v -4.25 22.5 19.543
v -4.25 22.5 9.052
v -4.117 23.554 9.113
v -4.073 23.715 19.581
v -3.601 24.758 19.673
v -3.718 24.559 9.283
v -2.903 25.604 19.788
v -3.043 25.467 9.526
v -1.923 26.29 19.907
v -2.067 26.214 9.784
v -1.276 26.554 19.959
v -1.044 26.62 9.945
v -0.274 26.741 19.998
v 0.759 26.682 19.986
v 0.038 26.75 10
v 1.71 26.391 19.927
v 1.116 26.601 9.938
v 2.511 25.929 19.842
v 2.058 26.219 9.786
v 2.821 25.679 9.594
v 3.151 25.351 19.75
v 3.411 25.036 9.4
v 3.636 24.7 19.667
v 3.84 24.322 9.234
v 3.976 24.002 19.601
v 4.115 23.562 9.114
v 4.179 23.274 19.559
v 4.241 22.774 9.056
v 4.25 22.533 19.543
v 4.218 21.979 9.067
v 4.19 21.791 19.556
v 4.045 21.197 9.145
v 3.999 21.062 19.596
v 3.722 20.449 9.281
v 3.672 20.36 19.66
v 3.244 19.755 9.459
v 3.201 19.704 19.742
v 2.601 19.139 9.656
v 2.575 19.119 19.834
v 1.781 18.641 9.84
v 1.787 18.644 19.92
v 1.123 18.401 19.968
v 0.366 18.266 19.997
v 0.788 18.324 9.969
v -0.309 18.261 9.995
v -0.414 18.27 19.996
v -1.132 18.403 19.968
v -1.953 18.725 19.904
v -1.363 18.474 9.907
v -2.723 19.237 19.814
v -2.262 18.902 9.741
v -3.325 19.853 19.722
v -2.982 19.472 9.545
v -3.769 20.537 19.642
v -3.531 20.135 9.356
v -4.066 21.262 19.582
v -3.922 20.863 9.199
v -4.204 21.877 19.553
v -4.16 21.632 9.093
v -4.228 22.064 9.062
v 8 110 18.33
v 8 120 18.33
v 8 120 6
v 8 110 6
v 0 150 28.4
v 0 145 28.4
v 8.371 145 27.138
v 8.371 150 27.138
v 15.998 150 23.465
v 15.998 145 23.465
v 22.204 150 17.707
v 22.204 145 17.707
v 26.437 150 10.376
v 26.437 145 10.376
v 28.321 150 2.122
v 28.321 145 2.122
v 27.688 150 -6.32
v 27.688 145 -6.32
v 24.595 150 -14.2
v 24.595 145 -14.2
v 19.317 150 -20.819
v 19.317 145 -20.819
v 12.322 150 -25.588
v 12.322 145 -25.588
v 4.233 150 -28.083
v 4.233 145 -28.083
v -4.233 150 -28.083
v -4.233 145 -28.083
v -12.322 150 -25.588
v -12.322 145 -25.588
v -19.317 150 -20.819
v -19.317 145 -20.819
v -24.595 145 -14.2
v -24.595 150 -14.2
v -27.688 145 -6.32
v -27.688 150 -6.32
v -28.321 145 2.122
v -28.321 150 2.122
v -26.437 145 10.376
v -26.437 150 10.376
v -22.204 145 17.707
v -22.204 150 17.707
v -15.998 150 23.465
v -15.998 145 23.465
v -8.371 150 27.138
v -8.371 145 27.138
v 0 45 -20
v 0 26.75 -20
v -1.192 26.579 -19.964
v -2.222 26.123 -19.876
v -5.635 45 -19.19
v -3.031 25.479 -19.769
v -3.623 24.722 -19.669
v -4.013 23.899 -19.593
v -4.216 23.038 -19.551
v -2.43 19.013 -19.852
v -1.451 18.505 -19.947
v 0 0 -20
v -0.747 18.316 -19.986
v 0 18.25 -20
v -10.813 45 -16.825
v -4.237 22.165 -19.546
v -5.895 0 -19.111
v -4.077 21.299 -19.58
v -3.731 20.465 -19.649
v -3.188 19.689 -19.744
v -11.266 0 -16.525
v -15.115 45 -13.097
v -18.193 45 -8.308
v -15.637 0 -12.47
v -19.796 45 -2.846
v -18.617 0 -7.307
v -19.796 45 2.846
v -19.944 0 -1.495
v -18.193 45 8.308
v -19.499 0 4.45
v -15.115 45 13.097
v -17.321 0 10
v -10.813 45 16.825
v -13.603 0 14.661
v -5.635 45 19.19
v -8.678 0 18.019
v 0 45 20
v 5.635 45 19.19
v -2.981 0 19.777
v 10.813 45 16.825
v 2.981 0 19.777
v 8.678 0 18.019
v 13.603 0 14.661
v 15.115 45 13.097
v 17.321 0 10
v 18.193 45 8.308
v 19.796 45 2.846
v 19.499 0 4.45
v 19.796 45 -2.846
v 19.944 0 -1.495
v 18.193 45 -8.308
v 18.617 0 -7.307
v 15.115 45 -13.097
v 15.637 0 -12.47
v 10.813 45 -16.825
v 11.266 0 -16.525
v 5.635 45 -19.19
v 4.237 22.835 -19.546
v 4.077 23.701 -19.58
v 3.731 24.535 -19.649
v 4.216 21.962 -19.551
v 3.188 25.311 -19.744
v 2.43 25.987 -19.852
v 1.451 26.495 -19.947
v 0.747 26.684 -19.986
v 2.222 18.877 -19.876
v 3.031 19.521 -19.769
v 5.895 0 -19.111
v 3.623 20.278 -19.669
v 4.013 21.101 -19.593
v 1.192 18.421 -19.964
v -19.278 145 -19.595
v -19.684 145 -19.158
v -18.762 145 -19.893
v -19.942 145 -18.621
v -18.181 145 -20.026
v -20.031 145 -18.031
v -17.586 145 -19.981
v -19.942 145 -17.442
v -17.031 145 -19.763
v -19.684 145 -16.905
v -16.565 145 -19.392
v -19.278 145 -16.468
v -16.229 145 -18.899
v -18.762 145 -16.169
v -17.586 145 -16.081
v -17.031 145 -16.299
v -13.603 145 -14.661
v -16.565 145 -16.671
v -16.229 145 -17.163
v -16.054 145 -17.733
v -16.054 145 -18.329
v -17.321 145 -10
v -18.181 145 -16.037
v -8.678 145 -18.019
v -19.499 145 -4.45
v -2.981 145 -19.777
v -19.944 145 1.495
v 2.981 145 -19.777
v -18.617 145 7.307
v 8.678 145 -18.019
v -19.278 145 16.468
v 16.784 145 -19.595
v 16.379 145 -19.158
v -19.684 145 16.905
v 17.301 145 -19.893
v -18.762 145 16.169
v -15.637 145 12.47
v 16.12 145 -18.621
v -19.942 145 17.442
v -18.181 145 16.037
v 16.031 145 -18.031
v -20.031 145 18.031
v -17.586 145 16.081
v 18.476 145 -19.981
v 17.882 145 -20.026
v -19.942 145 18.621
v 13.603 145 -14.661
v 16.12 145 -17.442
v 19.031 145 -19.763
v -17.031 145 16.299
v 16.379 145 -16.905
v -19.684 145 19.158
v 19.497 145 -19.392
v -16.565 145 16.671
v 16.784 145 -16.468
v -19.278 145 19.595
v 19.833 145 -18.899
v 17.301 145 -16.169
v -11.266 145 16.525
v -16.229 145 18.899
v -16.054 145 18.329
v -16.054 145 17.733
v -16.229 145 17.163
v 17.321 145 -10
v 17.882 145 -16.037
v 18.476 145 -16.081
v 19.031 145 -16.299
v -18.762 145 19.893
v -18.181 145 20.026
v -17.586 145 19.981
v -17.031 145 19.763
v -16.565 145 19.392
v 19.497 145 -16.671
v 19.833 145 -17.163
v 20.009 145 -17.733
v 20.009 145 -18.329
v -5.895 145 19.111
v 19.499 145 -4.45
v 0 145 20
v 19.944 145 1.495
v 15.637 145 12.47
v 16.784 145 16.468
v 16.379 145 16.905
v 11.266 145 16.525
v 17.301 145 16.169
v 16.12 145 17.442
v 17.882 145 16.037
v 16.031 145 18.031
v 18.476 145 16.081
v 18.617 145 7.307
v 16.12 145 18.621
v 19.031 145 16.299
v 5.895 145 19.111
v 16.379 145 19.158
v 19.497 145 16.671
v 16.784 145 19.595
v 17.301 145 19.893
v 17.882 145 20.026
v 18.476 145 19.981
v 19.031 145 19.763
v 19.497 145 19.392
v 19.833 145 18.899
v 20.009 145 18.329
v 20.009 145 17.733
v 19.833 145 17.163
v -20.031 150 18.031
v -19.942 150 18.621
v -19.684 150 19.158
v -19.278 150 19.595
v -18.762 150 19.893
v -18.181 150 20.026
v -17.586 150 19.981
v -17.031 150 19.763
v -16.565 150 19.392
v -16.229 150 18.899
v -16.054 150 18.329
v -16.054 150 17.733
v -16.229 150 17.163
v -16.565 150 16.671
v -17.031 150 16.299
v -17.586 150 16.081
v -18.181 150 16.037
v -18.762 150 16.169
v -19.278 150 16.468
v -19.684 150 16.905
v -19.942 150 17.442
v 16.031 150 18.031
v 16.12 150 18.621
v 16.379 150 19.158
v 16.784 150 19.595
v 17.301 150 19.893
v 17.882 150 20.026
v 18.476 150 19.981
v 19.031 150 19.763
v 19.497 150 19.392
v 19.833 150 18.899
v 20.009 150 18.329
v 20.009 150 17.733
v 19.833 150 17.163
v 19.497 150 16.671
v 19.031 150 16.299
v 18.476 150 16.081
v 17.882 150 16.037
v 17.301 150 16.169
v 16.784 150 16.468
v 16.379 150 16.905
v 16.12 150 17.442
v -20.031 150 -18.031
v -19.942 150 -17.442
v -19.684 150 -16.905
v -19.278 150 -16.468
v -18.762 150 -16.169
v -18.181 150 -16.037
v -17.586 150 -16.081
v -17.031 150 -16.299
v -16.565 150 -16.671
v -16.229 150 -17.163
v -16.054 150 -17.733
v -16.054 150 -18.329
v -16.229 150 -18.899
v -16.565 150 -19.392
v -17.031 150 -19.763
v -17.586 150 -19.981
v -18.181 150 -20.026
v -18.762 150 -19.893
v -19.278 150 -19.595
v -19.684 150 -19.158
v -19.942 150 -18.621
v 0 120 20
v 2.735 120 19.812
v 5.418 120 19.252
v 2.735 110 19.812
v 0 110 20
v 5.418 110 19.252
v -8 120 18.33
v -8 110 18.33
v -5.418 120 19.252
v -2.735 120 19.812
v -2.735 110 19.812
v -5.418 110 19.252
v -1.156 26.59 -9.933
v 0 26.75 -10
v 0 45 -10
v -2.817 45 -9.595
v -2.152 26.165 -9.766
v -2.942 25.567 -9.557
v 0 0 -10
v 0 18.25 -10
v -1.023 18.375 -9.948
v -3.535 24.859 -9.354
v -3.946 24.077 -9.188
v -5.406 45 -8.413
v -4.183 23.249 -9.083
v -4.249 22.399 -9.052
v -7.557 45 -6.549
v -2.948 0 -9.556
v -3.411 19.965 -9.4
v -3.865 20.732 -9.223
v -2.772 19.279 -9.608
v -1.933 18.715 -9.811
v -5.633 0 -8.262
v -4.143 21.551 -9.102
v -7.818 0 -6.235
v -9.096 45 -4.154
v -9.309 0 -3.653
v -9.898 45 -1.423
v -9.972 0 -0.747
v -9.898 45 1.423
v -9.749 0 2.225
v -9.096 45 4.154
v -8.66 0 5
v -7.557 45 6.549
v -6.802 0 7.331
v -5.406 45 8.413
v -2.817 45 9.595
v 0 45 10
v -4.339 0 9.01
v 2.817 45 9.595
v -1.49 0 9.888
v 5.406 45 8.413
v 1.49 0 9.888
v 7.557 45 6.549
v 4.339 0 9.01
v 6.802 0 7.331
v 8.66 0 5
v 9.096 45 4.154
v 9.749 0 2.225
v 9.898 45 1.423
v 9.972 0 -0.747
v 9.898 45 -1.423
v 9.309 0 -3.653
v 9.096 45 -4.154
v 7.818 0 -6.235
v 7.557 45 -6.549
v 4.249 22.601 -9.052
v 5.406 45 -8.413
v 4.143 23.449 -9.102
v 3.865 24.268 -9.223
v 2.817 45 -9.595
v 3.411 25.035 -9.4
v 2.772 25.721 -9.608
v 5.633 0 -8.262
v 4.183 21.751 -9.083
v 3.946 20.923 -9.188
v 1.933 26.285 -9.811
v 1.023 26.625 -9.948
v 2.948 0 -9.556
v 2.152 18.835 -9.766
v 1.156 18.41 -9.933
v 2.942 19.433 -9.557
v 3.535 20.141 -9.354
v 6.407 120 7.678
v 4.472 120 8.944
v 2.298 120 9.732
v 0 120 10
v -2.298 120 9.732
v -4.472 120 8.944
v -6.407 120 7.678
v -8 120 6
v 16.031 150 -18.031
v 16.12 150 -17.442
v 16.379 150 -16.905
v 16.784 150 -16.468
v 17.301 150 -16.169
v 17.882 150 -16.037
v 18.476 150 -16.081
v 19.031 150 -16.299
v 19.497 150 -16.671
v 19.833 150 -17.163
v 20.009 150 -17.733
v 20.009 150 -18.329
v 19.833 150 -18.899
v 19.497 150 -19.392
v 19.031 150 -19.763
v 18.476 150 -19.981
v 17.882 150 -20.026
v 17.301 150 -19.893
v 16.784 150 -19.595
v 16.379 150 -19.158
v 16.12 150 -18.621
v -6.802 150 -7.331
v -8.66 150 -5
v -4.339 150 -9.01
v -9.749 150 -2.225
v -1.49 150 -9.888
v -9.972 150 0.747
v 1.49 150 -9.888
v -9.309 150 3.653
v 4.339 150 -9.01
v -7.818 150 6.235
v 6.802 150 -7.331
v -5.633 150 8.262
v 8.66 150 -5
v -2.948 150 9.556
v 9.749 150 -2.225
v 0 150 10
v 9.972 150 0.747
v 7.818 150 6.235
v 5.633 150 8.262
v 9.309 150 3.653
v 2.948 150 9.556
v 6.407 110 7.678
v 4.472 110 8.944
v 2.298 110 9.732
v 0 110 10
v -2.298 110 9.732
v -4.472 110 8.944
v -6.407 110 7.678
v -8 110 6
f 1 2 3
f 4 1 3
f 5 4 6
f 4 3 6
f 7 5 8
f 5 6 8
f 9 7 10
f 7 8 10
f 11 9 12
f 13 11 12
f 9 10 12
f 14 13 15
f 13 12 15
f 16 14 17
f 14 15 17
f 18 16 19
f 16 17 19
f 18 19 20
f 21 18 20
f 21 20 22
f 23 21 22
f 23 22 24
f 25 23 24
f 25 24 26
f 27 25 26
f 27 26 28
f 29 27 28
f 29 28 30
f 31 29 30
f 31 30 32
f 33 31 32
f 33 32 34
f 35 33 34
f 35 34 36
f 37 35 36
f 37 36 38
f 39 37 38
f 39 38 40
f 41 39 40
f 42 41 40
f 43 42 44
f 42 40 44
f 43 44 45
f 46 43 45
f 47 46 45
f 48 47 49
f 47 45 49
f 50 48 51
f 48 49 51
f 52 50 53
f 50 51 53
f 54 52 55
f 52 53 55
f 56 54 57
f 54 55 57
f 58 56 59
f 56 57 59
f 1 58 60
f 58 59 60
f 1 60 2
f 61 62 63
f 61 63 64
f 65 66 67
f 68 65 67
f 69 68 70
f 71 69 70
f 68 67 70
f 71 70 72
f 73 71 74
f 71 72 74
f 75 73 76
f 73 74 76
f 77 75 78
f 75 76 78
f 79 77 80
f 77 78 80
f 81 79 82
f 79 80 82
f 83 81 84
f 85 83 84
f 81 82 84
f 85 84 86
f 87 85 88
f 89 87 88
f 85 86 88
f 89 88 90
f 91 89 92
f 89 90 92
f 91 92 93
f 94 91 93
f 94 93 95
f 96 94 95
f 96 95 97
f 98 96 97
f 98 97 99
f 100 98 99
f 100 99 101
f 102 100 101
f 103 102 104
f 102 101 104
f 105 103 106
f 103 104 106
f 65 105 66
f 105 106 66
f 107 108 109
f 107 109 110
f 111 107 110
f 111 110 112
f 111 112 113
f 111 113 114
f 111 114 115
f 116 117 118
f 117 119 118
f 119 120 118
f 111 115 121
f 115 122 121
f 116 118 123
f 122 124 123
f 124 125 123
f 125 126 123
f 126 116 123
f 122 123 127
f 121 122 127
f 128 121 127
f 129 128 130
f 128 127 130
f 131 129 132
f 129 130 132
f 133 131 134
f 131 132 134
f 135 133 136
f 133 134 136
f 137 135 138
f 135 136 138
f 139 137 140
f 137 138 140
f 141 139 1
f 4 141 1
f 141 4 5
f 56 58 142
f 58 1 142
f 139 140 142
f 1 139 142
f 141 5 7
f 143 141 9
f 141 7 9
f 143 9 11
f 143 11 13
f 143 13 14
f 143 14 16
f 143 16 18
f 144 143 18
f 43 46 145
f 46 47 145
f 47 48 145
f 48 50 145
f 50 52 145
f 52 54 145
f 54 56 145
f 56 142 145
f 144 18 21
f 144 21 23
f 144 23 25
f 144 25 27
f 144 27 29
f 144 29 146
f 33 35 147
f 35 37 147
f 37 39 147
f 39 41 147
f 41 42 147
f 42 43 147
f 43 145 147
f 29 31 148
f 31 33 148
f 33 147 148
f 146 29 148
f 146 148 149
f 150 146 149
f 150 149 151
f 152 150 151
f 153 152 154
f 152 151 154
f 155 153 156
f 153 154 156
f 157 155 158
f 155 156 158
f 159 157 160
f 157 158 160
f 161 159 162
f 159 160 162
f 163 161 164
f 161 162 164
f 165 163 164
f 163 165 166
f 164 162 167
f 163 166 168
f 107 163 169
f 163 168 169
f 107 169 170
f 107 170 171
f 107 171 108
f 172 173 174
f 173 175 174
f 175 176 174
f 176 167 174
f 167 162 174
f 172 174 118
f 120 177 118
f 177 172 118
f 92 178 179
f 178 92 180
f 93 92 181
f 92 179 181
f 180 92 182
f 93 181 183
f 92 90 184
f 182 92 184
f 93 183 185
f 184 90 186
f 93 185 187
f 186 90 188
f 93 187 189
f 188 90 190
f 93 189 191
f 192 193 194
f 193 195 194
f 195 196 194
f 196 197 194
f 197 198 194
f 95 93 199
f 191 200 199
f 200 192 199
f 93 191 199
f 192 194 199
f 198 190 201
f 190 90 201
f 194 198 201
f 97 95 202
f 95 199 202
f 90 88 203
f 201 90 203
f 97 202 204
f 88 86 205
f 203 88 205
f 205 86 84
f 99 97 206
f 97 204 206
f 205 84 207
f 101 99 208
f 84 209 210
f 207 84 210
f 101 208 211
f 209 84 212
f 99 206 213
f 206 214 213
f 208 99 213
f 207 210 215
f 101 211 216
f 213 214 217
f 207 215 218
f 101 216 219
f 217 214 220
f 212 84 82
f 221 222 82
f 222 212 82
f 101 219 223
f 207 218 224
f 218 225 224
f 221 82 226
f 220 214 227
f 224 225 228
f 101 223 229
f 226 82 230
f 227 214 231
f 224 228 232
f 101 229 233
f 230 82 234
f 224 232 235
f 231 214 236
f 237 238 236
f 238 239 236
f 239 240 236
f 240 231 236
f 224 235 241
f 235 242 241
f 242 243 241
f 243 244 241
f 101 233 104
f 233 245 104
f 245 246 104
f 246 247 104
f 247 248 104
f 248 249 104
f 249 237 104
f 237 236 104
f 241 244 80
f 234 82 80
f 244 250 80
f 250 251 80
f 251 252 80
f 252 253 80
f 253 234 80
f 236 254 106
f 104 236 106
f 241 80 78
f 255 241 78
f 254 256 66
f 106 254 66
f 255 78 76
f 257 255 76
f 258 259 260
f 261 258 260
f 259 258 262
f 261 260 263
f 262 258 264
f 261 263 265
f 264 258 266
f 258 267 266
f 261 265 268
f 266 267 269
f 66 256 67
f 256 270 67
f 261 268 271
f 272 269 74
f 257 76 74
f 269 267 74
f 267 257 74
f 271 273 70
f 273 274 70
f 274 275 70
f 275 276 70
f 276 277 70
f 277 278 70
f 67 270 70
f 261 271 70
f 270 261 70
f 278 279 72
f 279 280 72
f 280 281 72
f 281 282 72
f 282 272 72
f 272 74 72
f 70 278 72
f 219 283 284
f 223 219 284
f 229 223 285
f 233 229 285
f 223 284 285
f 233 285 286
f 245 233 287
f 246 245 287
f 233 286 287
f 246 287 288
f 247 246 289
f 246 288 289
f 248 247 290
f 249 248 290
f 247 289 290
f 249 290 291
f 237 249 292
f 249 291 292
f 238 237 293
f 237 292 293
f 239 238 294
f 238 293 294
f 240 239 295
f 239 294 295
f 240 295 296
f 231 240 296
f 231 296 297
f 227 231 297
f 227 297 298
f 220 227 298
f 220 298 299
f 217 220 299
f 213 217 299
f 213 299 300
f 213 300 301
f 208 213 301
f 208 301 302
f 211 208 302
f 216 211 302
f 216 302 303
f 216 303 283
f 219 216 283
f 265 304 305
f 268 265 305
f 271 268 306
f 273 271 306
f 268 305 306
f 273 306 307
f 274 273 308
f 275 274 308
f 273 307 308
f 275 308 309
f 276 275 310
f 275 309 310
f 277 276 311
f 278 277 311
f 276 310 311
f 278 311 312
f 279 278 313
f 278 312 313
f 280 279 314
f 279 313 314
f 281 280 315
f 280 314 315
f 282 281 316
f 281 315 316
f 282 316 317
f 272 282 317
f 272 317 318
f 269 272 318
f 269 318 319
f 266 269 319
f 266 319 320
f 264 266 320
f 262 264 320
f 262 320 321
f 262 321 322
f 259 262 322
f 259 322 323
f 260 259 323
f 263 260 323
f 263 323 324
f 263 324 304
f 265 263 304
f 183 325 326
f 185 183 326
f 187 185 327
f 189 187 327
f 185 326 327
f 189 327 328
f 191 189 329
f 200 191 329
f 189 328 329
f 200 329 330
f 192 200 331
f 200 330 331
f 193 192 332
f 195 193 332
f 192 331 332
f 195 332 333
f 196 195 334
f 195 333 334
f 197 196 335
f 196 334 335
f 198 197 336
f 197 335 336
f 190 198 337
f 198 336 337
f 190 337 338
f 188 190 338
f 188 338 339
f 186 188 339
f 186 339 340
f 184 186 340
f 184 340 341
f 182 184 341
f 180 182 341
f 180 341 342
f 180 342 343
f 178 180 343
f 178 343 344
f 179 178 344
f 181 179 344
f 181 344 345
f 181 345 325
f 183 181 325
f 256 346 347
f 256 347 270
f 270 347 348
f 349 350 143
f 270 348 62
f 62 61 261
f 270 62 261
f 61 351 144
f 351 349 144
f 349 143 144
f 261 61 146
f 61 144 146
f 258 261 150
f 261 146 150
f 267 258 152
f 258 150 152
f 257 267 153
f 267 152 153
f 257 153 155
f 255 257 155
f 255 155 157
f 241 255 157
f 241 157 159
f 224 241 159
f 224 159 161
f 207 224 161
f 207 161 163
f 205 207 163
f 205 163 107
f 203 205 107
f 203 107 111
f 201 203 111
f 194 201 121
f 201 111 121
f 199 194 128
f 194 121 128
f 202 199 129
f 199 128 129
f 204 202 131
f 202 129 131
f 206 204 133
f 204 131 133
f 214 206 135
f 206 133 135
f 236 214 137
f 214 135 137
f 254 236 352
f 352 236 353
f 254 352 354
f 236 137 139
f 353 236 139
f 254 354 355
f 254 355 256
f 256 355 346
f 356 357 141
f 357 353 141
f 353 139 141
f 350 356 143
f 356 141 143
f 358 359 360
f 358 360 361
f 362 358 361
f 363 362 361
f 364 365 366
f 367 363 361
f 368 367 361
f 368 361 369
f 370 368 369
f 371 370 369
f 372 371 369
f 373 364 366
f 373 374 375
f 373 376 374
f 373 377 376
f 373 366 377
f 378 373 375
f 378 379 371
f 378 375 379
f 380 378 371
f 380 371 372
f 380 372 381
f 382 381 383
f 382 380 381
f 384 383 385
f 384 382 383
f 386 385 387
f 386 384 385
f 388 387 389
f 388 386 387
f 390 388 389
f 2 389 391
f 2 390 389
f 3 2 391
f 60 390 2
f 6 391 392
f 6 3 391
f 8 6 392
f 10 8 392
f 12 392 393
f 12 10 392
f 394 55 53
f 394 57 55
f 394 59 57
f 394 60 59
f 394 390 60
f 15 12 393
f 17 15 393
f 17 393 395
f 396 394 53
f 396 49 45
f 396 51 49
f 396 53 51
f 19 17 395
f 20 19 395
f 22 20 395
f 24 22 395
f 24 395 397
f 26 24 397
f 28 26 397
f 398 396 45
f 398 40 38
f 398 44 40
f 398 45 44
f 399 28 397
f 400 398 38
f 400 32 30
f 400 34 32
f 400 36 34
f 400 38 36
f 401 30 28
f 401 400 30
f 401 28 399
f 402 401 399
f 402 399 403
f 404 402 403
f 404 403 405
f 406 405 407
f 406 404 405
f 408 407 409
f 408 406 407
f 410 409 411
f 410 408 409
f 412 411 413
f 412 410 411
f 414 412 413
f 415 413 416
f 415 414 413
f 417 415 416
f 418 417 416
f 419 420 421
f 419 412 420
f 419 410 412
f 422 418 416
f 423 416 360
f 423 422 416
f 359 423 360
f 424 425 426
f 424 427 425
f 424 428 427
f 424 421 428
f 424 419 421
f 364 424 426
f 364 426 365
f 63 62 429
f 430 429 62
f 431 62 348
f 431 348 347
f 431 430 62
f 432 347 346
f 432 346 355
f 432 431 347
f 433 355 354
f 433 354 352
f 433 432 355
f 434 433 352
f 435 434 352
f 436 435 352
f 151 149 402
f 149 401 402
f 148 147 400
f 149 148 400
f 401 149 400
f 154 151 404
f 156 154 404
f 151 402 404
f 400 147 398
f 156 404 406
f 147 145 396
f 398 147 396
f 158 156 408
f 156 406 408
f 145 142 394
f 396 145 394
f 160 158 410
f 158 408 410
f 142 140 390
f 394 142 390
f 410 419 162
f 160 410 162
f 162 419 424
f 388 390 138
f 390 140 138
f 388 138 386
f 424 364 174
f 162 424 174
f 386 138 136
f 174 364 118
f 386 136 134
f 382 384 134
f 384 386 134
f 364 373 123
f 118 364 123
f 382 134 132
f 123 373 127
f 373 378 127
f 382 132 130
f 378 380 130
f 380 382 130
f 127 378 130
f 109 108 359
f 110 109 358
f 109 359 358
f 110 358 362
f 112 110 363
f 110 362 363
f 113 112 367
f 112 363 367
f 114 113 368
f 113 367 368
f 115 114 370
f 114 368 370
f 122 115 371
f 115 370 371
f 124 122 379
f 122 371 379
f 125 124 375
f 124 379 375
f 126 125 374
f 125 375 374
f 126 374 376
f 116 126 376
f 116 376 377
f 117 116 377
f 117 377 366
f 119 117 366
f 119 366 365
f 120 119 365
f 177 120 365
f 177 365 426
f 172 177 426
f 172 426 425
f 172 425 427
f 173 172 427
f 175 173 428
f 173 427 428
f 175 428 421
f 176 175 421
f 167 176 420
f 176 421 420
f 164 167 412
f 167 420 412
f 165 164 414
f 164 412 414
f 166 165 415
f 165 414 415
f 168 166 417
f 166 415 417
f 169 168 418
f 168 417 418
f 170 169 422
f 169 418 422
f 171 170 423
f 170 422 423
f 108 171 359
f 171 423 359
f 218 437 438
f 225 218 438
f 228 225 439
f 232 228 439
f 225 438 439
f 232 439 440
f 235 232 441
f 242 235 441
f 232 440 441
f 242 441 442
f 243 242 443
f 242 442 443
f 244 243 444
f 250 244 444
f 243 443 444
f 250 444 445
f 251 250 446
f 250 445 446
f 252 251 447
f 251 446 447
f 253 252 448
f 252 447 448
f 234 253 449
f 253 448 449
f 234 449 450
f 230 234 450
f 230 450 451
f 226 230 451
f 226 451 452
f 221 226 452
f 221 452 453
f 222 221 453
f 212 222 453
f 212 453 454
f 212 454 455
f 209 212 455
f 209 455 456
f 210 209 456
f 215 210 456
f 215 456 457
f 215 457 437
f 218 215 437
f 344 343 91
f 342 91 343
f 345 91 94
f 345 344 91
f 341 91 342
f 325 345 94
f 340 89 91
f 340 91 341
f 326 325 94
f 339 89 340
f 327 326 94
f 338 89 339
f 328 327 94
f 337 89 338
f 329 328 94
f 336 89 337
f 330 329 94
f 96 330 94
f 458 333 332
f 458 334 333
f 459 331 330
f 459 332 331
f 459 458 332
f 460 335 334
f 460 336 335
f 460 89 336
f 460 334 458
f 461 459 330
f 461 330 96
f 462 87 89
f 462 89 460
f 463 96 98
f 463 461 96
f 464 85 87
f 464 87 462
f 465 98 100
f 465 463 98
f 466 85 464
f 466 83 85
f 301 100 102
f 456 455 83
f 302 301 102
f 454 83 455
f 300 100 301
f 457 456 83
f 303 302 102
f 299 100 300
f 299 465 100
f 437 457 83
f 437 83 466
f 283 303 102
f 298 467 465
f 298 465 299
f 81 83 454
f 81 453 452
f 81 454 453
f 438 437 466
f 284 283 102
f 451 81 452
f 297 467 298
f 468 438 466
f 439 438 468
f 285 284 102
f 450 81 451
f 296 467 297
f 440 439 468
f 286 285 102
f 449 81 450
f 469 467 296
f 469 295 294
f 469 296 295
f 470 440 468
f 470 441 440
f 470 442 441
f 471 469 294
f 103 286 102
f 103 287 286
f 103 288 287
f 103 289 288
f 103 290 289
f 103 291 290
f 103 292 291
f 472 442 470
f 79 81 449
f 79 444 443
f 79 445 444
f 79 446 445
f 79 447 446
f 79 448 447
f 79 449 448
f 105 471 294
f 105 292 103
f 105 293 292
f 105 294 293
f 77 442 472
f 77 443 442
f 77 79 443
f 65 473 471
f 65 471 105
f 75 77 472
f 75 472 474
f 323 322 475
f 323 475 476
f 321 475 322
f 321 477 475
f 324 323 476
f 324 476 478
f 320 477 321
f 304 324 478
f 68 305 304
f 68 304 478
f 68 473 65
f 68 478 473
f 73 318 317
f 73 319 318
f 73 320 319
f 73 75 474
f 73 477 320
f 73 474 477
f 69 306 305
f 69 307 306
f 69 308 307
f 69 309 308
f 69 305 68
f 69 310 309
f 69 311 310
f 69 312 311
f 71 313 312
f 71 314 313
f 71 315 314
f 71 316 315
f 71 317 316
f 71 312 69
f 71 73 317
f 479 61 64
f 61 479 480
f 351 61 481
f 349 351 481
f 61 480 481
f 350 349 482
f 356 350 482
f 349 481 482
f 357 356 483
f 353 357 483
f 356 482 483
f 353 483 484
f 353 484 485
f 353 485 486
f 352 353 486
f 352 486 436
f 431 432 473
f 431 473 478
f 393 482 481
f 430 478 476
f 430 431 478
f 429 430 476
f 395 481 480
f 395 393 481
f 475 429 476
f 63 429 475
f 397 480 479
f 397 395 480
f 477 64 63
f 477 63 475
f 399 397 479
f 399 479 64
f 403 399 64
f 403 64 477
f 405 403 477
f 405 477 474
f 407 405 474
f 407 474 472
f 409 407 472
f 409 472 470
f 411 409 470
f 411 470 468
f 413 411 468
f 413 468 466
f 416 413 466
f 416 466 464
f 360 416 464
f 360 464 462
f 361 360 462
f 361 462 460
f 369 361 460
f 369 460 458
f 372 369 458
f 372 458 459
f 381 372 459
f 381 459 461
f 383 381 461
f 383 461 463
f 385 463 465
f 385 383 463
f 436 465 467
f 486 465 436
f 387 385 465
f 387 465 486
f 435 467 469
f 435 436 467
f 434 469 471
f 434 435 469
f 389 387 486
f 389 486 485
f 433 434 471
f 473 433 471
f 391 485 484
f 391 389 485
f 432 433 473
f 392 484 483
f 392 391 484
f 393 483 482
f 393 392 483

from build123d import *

# Parameters (mm, degrees)
SKETCH_1_R                        = 20
SKETCH_1_R_2                      = 10
EXTRUDE_1_DEPTH                   = 45
HOLE_WIZARD_M10_1_D               = 8.5
HOLE_WIZARD_M10_1_DEPTH           = 12.5
HOLE_WIZARD_M10_1_TIP             = 2.553657631
HOLE_WIZARD_M10_1_ON_FACE_2_D     = 8.5
HOLE_WIZARD_M10_1_ON_FACE_2_DEPTH = 12.5
HOLE_WIZARD_M10_1_ON_FACE_2_TIP   = 2.553657631
SKETCH_4_R                        = 20
SKETCH_4_R_2                      = 10
EXTRUDE_2_DEPTH                   = 105
EXTRUDE_START                     = -5
SKETCH_5_R                        = 28.4
SKETCH_5_R_2                      = 20
EXTRUDE_3_DEPTH                   = 5
HOLE_WIZARD_4_0_4_1_D             = 4
CUT_EXTRUDE_2_DEPTH               = 25


with BuildPart() as part:
    # 草图1 → 凸台-拉伸1 (new body)
    with BuildSketch(Plane(origin=(0, 0, 0), x_dir=(1, 0, 0), z_dir=(0, 1, 0))):
        Circle(SKETCH_1_R)
        Circle(SKETCH_1_R_2, mode=Mode.SUBTRACT)
    extrude(amount=EXTRUDE_1_DEPTH)

    # M10 螺纹孔1
    with Locations(Plane(origin=(0, 22.5, -20), x_dir=(0, -1, 0), z_dir=(0, 0, -1))):
        with Locations((0, 0)):
            Hole(HOLE_WIZARD_M10_1_D / 2, depth=HOLE_WIZARD_M10_1_DEPTH)
            with Locations((0, 0, -(HOLE_WIZARD_M10_1_DEPTH + HOLE_WIZARD_M10_1_TIP / 2))):  # 118° drill point
                Cone(0, HOLE_WIZARD_M10_1_D / 2, HOLE_WIZARD_M10_1_TIP, mode=Mode.SUBTRACT)

    # M10 螺纹孔1 on face 2
    with Locations(Plane(origin=(0, 22.5, 20), x_dir=(1, 0, 0), z_dir=(0, 0, 1))):
        with Locations((0, 0)):
            Hole(HOLE_WIZARD_M10_1_ON_FACE_2_D / 2, depth=HOLE_WIZARD_M10_1_ON_FACE_2_DEPTH)
            with Locations((0, 0, -(HOLE_WIZARD_M10_1_ON_FACE_2_DEPTH + HOLE_WIZARD_M10_1_ON_FACE_2_TIP / 2))):  # 118° drill point
                Cone(0, HOLE_WIZARD_M10_1_ON_FACE_2_D / 2, HOLE_WIZARD_M10_1_ON_FACE_2_TIP, mode=Mode.SUBTRACT)

    # 草图4 → 凸台-拉伸2 (add)
    with BuildSketch(Plane(origin=(0, 45, 0), x_dir=(1, 0, 0), z_dir=(0, 1, 0))):
        Circle(SKETCH_4_R)
        Circle(SKETCH_4_R_2, mode=Mode.SUBTRACT)
    extrude(amount=EXTRUDE_2_DEPTH)

    # 草图5 → 凸台-拉伸3 (add)
    with BuildSketch(Plane(origin=(0, 150, 0), x_dir=(1, 0, 0), z_dir=(0, 1, 0)).offset(EXTRUDE_START)):
        Circle(SKETCH_5_R)
        Circle(SKETCH_5_R_2, mode=Mode.SUBTRACT)
    extrude(amount=EXTRUDE_3_DEPTH)

    # Ø4.0 (4) 直径孔1 (through all)
    with Locations(Plane.XZ.offset(-145)):
        with Locations((-18.03122292, -18.03122292), (-18.03122292, 18.03122292), (18.03122292, 18.03122292), (18.03122292, -18.03122292)):
            Hole(HOLE_WIZARD_4_0_4_1_D / 2)

    # 草图10 → 切除-拉伸2 (cut)
    with BuildSketch(Plane.XY):
        Polygon((0, 120), (8, 120), (8, 110), (-8, 110), (-8, 120), align=None)
    extrude(amount=CUT_EXTRUDE_2_DEPTH, mode=Mode.SUBTRACT)


solid = part.part
